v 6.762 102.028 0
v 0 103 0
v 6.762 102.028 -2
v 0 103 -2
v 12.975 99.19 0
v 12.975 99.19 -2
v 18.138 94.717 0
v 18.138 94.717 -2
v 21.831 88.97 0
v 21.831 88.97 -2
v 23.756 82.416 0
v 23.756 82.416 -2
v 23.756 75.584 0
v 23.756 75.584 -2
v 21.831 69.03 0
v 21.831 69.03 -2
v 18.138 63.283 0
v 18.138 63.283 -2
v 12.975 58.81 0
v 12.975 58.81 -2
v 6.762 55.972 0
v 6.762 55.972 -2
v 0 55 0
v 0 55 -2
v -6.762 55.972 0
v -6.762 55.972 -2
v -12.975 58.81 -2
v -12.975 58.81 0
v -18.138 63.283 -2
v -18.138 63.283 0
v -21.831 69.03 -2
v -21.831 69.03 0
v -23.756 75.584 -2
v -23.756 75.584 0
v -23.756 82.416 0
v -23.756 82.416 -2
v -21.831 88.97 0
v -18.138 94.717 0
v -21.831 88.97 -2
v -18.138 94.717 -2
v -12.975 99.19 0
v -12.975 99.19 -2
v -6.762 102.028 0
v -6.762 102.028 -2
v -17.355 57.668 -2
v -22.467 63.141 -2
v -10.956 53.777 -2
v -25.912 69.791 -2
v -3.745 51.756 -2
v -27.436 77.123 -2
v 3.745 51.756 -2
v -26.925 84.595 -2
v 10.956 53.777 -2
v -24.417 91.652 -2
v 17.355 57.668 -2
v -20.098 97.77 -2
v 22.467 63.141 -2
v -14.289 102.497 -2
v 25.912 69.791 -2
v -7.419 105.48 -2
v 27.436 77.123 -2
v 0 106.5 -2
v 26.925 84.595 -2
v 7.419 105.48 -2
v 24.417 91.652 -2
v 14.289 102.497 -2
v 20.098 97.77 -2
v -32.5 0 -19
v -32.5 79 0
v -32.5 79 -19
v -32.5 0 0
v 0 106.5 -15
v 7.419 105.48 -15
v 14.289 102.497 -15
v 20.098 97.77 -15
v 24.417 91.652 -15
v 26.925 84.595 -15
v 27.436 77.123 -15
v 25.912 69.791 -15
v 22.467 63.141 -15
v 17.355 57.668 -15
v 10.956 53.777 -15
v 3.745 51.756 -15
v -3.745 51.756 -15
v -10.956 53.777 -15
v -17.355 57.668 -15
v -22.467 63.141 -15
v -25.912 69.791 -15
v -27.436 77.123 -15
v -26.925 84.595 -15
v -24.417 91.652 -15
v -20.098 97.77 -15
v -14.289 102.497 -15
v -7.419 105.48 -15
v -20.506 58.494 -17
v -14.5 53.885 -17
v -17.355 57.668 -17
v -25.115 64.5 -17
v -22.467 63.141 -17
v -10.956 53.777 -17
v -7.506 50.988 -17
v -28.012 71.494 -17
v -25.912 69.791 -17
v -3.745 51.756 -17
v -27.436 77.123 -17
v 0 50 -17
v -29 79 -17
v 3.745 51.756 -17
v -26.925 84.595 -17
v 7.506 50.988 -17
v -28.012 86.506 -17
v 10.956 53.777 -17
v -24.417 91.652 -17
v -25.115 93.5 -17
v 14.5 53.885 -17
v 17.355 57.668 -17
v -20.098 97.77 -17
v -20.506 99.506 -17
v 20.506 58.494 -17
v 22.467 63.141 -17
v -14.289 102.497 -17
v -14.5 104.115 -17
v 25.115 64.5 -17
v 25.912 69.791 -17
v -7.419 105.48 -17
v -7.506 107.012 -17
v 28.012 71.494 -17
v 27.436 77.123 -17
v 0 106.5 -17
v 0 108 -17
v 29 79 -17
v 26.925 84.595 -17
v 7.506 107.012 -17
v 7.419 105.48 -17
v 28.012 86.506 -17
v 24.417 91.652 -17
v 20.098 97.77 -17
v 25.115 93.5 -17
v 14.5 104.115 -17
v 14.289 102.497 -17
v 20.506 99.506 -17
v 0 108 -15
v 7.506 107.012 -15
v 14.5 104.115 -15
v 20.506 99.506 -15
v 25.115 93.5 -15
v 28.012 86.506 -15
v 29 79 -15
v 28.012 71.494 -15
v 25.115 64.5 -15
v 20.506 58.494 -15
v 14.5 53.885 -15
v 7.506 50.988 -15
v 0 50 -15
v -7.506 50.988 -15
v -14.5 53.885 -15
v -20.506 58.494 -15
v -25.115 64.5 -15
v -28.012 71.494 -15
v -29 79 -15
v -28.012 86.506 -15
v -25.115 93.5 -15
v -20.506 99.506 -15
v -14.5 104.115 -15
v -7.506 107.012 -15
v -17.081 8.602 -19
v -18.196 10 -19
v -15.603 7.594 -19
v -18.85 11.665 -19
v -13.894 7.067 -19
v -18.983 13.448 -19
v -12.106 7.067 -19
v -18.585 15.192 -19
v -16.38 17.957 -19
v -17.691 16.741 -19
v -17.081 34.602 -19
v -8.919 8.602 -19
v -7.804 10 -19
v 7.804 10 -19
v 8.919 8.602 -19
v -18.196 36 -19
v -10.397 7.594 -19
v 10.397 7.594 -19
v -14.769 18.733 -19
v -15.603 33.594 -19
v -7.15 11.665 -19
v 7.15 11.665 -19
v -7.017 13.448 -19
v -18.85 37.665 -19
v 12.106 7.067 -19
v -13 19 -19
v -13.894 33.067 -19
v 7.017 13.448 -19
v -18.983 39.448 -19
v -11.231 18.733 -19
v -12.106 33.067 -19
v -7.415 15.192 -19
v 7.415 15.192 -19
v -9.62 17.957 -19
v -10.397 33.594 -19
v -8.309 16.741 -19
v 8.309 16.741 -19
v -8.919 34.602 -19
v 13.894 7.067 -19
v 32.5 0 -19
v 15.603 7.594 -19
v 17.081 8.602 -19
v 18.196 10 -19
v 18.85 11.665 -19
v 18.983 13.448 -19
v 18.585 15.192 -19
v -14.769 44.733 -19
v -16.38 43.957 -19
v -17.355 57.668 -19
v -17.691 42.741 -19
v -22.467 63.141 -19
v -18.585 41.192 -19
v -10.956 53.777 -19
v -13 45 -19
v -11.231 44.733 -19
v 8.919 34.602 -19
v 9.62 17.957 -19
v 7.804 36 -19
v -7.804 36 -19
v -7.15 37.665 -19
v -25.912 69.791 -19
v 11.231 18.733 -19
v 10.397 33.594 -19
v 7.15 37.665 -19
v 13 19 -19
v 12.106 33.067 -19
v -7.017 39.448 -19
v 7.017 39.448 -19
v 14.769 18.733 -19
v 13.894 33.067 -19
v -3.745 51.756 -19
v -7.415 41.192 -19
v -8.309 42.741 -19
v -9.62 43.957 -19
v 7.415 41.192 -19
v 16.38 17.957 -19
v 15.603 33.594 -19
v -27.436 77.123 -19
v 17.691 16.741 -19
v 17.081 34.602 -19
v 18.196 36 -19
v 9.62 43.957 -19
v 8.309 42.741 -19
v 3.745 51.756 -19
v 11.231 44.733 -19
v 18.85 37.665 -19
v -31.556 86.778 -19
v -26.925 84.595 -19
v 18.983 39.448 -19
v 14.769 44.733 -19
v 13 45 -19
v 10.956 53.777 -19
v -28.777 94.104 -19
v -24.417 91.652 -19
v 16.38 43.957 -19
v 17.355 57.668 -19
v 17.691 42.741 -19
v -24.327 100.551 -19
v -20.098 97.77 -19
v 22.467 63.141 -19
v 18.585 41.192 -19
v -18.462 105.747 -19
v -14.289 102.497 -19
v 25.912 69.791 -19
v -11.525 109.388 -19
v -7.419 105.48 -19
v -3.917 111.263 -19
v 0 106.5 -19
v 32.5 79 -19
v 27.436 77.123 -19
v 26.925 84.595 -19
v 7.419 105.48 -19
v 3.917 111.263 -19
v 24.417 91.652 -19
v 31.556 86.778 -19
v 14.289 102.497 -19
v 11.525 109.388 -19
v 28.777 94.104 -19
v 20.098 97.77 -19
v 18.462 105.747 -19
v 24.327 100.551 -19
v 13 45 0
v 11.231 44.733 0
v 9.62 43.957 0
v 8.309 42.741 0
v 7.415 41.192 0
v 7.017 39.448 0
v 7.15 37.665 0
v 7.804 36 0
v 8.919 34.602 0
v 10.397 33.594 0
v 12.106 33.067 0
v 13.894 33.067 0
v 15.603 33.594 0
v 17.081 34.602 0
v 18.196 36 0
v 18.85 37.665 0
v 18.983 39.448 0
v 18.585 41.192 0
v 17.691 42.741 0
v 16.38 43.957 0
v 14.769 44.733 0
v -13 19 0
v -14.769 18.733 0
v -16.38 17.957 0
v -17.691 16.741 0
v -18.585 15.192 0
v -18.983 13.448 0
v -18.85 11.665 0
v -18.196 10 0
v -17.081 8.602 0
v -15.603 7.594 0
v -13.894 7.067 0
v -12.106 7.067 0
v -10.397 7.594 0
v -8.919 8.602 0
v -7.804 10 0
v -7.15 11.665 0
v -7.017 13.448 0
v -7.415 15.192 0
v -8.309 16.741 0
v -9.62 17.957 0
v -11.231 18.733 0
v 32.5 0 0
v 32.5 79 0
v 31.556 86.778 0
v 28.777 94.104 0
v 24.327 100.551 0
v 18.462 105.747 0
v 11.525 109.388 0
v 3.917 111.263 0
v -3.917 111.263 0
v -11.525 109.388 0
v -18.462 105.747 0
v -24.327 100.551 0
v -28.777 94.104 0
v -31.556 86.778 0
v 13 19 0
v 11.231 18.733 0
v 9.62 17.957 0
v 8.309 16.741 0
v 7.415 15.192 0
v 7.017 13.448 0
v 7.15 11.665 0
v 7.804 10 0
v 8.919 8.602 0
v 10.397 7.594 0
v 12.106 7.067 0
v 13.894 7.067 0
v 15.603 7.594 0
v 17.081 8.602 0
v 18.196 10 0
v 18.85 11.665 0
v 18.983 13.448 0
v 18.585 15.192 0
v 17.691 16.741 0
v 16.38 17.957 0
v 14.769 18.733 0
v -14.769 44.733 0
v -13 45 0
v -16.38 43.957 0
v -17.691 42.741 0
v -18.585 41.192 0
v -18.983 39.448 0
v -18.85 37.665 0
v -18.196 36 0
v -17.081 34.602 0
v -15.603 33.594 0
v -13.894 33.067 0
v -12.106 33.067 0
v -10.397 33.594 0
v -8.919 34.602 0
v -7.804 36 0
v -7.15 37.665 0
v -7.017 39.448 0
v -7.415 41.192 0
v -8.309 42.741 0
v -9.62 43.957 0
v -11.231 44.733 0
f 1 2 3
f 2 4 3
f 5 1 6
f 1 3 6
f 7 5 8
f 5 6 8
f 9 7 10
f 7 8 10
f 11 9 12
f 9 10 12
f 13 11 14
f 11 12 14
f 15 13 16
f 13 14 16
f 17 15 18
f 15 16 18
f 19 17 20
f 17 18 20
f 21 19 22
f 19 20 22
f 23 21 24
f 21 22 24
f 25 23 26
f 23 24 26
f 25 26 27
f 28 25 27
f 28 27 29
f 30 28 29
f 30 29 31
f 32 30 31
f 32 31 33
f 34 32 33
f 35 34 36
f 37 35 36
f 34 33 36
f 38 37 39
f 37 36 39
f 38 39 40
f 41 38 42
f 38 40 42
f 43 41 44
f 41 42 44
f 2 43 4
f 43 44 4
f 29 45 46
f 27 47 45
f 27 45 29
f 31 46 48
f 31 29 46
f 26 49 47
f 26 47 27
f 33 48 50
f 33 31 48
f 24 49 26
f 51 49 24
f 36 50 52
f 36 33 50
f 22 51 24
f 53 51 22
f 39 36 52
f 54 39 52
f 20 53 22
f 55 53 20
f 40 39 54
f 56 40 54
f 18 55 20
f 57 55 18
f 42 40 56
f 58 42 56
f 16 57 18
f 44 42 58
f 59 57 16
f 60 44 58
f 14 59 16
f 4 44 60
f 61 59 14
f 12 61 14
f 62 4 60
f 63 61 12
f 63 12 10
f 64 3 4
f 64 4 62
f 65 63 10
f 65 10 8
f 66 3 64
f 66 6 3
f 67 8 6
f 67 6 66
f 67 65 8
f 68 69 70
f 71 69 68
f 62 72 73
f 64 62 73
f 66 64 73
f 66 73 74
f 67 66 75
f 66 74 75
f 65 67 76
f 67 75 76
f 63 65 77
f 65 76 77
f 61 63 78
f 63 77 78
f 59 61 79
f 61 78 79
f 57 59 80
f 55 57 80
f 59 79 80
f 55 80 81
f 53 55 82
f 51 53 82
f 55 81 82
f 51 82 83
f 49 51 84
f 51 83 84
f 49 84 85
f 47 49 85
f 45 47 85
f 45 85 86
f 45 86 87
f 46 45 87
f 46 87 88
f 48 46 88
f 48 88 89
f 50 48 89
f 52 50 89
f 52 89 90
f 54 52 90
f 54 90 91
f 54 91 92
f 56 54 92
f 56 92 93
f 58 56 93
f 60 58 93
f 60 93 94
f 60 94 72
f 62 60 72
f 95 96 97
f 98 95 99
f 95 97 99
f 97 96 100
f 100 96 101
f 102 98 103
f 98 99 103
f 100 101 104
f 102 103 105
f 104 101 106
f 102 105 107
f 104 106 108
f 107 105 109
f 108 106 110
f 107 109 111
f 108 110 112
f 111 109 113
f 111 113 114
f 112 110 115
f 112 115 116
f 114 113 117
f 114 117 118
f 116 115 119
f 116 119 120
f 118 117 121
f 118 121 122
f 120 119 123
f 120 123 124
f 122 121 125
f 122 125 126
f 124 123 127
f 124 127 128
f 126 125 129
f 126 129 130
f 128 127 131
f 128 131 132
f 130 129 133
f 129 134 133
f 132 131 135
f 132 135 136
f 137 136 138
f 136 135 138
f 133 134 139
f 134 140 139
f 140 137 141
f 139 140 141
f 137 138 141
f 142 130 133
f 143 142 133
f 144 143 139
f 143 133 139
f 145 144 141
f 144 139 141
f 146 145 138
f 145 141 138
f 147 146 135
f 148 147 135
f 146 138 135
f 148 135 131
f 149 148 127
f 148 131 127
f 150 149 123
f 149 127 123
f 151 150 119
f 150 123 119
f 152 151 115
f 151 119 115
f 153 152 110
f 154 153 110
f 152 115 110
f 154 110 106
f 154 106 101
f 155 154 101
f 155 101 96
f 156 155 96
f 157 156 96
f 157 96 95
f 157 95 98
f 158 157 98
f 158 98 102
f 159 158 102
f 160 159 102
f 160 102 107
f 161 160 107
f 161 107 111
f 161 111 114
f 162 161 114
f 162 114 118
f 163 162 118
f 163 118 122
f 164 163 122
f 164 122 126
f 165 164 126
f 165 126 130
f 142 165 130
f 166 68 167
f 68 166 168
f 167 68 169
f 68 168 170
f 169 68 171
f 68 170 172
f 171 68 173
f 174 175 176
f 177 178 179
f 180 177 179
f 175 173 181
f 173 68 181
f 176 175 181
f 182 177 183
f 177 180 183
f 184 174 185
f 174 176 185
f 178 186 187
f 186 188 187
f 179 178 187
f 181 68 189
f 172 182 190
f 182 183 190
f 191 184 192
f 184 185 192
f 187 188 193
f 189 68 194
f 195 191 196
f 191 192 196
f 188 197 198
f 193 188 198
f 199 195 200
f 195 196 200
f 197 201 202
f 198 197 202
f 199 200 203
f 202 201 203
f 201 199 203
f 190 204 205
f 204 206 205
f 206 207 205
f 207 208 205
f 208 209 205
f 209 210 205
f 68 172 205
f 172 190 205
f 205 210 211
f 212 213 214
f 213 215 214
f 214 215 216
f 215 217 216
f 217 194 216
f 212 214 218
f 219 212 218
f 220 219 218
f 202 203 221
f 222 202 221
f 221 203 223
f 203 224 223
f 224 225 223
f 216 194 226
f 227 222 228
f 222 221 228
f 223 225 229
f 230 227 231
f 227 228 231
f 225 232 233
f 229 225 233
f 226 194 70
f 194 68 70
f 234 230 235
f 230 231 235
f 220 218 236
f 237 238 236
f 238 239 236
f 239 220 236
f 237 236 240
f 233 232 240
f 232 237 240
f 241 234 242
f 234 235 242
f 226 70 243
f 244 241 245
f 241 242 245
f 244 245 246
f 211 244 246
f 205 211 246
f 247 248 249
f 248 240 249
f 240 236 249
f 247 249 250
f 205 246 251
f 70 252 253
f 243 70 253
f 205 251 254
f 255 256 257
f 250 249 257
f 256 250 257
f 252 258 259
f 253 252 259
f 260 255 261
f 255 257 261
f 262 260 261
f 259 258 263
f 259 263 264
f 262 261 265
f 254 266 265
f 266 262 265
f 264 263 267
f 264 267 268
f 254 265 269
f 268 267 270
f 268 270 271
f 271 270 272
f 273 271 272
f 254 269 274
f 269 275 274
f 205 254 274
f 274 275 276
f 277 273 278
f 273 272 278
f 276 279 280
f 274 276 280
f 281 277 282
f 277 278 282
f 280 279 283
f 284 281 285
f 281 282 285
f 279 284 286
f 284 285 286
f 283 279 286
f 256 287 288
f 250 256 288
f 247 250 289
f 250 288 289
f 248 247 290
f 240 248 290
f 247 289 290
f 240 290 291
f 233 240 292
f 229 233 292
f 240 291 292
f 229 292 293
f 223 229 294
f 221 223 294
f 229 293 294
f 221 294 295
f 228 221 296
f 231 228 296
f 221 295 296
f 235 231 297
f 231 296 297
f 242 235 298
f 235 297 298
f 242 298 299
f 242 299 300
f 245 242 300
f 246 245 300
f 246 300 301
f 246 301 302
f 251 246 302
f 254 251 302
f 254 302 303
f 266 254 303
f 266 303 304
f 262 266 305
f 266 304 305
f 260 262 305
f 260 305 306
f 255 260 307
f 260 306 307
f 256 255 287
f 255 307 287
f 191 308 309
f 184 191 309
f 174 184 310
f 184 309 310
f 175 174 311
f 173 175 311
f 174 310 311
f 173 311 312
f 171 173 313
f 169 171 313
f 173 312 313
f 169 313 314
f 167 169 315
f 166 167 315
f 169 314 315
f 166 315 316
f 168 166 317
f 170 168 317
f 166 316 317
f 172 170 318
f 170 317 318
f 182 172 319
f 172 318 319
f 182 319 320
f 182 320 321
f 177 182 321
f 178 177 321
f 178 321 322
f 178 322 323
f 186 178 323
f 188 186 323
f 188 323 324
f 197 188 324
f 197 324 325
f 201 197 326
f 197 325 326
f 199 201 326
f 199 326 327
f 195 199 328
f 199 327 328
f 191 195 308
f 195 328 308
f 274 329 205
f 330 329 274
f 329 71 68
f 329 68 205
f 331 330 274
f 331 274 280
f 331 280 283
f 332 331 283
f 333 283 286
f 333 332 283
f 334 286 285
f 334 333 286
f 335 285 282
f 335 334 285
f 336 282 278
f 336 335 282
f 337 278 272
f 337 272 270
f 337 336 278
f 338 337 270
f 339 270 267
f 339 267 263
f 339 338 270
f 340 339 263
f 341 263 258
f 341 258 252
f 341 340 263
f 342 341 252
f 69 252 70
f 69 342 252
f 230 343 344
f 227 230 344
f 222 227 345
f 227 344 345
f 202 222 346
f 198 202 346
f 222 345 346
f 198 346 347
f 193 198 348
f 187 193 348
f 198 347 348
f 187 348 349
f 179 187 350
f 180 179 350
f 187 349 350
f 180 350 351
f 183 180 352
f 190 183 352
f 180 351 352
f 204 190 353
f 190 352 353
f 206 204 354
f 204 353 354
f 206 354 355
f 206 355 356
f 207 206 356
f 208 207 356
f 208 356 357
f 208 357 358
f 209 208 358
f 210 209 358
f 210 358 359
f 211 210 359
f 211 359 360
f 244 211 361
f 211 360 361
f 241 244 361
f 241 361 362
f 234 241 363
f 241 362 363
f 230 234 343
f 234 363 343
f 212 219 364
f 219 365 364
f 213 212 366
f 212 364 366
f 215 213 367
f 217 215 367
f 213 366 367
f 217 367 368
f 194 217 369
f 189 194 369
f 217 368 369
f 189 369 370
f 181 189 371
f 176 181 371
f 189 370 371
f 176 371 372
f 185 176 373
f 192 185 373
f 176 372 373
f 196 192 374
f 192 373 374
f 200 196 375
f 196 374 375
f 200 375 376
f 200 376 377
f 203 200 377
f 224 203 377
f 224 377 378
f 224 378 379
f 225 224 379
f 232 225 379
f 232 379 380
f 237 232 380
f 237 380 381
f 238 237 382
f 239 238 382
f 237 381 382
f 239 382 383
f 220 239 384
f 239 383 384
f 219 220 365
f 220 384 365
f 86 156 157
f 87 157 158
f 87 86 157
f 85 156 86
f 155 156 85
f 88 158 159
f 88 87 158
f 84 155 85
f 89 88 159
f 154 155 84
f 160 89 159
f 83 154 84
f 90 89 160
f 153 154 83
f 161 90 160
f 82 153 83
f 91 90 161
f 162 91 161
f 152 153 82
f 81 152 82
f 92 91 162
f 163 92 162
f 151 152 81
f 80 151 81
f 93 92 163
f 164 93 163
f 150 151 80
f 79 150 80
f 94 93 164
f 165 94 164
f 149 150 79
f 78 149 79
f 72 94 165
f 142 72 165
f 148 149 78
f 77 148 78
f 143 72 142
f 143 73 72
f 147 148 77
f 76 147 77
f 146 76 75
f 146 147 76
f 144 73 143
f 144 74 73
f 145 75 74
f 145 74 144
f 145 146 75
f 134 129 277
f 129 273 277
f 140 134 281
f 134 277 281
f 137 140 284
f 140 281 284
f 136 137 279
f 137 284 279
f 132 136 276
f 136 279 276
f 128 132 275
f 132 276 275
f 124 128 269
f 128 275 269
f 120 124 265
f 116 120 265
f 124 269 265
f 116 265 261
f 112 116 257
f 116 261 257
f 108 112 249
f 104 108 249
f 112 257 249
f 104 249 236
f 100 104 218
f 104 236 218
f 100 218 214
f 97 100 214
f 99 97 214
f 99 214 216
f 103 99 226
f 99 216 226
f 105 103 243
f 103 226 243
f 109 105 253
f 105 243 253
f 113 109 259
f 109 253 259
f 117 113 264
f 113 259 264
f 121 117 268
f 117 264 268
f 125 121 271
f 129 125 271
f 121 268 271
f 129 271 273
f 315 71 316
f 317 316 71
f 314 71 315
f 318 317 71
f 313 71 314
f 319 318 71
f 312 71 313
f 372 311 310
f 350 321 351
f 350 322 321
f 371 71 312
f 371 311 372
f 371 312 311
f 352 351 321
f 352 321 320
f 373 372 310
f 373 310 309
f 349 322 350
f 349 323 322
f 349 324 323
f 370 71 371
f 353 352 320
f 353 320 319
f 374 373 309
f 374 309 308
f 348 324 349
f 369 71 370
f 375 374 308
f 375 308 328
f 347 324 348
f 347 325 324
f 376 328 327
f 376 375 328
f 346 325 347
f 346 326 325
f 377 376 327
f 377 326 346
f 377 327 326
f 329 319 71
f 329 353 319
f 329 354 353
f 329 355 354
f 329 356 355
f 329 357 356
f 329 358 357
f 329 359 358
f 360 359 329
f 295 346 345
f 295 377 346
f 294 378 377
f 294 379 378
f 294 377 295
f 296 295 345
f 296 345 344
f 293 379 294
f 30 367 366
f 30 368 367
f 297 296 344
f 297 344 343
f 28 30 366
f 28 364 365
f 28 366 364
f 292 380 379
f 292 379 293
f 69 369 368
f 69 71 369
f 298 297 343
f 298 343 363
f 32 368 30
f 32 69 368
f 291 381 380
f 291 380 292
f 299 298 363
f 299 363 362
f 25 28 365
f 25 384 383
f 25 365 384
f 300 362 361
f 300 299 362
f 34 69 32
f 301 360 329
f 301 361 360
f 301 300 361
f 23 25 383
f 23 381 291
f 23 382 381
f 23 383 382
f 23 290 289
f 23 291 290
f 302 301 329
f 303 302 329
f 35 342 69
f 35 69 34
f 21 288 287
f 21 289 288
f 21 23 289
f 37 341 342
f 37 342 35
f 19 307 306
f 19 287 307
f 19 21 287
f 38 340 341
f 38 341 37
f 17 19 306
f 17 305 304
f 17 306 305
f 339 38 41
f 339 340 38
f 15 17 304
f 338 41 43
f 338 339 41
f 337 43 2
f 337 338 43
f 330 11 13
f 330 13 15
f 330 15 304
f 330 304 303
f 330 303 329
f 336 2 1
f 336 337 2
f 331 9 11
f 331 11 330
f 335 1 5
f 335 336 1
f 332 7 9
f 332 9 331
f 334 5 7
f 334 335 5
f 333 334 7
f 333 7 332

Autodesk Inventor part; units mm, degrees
sketch "Sketch_7" plane through (0, 0, 0) normal (0, 0, 1) x (1, 0, 0)
  line L0 (-32.5, 79) -> (-32.5, 0)
  line L1 (-32.5, 0) -> (32.5, 0)
  line L2 (32.5, 0) -> (32.5, 79)
  arc A0 (32.5, 79) -> (-32.5, 79) centre (0, 79) ccw
extrude "Extrusion1" add sketch "Sketch_7" against normal blind 19
sketch "Sketch_8" plane through (0, 0, 0) normal (1, 0, 0) x (0, 0, -1)
  line L0 (19, 79) -> (2, 79)
  line L1 (2, 79) -> (2, 106.5)
  line L2 (2, 106.5) -> (15, 106.5)
  line L3 (15, 106.5) -> (15, 108)
  line L4 (15, 108) -> (17, 108)
  line L5 (17, 108) -> (17, 106.5)
  line L6 (17, 106.5) -> (19, 106.5)
  line L7 (19, 106.5) -> (19, 79)
  line L8 (19, 79) -> (2, 79)
revolve "Revolution1" cut sketch "Sketch_8" angle 360 about axis through (0, 79, -19) along (0, 0, -1)
sketch "Sketch_1" plane through (0, 0, 0) normal (1, 0, 0) x (0, 0, -1)
  line L0 (19, 79) -> (0, 79)
  line L1 (0, 79) -> (0, 103)
  line L2 (0, 103) -> (19, 103)
  line L3 (19, 103) -> (19, 79)
  line L4 (19, 79) -> (0, 79)
revolve "Revolution2" cut sketch "Sketch_1" angle 360 about axis through (0, 79, -19) along (0, 0, -1)
sketch "Sketch4" plane through (0, 0, -19) normal (0, 0, -1) x (-1, 0, 0)
  point P0 (13, 13)
hole "Hole1" at (-13, 13, -19) direction (0, 0, 1) diameter 12 depth 19
pattern_linear "Rectangular Pattern1" count 2 spacing 26 along (1, 0, 0) count 2 spacing 26 along (0, 1, 0) of "Hole1"
ref_plane "to_bearing_XY" through (0, 79, -8.5) normal (0, 0, 1) x (1, 0, 0)
ref_plane "to_bearing_YZ" through (0, 79, -8.5) normal (1, 0, 0) x (0, 1, 0)
ref_plane "to_bearing_ZX" through (0, 79, -8.5) normal (0, 1, 0) x (0, 0, 1)
ref_plane "to_retaining_ring_XY" through (0, 79, -17) normal (0, 0, -1) x (1, 0, 0)
ref_plane "to_retaining_ring_YZ" through (0, 79, -17) normal (1, 0, 0) x (0, -1, 0)
ref_plane "to_retaining_ring_ZX" through (0, 79, -17) normal (0, -1, 0) x (0, 0, -1)
properties part number "SBGSMA6006ZZ-40_h"
